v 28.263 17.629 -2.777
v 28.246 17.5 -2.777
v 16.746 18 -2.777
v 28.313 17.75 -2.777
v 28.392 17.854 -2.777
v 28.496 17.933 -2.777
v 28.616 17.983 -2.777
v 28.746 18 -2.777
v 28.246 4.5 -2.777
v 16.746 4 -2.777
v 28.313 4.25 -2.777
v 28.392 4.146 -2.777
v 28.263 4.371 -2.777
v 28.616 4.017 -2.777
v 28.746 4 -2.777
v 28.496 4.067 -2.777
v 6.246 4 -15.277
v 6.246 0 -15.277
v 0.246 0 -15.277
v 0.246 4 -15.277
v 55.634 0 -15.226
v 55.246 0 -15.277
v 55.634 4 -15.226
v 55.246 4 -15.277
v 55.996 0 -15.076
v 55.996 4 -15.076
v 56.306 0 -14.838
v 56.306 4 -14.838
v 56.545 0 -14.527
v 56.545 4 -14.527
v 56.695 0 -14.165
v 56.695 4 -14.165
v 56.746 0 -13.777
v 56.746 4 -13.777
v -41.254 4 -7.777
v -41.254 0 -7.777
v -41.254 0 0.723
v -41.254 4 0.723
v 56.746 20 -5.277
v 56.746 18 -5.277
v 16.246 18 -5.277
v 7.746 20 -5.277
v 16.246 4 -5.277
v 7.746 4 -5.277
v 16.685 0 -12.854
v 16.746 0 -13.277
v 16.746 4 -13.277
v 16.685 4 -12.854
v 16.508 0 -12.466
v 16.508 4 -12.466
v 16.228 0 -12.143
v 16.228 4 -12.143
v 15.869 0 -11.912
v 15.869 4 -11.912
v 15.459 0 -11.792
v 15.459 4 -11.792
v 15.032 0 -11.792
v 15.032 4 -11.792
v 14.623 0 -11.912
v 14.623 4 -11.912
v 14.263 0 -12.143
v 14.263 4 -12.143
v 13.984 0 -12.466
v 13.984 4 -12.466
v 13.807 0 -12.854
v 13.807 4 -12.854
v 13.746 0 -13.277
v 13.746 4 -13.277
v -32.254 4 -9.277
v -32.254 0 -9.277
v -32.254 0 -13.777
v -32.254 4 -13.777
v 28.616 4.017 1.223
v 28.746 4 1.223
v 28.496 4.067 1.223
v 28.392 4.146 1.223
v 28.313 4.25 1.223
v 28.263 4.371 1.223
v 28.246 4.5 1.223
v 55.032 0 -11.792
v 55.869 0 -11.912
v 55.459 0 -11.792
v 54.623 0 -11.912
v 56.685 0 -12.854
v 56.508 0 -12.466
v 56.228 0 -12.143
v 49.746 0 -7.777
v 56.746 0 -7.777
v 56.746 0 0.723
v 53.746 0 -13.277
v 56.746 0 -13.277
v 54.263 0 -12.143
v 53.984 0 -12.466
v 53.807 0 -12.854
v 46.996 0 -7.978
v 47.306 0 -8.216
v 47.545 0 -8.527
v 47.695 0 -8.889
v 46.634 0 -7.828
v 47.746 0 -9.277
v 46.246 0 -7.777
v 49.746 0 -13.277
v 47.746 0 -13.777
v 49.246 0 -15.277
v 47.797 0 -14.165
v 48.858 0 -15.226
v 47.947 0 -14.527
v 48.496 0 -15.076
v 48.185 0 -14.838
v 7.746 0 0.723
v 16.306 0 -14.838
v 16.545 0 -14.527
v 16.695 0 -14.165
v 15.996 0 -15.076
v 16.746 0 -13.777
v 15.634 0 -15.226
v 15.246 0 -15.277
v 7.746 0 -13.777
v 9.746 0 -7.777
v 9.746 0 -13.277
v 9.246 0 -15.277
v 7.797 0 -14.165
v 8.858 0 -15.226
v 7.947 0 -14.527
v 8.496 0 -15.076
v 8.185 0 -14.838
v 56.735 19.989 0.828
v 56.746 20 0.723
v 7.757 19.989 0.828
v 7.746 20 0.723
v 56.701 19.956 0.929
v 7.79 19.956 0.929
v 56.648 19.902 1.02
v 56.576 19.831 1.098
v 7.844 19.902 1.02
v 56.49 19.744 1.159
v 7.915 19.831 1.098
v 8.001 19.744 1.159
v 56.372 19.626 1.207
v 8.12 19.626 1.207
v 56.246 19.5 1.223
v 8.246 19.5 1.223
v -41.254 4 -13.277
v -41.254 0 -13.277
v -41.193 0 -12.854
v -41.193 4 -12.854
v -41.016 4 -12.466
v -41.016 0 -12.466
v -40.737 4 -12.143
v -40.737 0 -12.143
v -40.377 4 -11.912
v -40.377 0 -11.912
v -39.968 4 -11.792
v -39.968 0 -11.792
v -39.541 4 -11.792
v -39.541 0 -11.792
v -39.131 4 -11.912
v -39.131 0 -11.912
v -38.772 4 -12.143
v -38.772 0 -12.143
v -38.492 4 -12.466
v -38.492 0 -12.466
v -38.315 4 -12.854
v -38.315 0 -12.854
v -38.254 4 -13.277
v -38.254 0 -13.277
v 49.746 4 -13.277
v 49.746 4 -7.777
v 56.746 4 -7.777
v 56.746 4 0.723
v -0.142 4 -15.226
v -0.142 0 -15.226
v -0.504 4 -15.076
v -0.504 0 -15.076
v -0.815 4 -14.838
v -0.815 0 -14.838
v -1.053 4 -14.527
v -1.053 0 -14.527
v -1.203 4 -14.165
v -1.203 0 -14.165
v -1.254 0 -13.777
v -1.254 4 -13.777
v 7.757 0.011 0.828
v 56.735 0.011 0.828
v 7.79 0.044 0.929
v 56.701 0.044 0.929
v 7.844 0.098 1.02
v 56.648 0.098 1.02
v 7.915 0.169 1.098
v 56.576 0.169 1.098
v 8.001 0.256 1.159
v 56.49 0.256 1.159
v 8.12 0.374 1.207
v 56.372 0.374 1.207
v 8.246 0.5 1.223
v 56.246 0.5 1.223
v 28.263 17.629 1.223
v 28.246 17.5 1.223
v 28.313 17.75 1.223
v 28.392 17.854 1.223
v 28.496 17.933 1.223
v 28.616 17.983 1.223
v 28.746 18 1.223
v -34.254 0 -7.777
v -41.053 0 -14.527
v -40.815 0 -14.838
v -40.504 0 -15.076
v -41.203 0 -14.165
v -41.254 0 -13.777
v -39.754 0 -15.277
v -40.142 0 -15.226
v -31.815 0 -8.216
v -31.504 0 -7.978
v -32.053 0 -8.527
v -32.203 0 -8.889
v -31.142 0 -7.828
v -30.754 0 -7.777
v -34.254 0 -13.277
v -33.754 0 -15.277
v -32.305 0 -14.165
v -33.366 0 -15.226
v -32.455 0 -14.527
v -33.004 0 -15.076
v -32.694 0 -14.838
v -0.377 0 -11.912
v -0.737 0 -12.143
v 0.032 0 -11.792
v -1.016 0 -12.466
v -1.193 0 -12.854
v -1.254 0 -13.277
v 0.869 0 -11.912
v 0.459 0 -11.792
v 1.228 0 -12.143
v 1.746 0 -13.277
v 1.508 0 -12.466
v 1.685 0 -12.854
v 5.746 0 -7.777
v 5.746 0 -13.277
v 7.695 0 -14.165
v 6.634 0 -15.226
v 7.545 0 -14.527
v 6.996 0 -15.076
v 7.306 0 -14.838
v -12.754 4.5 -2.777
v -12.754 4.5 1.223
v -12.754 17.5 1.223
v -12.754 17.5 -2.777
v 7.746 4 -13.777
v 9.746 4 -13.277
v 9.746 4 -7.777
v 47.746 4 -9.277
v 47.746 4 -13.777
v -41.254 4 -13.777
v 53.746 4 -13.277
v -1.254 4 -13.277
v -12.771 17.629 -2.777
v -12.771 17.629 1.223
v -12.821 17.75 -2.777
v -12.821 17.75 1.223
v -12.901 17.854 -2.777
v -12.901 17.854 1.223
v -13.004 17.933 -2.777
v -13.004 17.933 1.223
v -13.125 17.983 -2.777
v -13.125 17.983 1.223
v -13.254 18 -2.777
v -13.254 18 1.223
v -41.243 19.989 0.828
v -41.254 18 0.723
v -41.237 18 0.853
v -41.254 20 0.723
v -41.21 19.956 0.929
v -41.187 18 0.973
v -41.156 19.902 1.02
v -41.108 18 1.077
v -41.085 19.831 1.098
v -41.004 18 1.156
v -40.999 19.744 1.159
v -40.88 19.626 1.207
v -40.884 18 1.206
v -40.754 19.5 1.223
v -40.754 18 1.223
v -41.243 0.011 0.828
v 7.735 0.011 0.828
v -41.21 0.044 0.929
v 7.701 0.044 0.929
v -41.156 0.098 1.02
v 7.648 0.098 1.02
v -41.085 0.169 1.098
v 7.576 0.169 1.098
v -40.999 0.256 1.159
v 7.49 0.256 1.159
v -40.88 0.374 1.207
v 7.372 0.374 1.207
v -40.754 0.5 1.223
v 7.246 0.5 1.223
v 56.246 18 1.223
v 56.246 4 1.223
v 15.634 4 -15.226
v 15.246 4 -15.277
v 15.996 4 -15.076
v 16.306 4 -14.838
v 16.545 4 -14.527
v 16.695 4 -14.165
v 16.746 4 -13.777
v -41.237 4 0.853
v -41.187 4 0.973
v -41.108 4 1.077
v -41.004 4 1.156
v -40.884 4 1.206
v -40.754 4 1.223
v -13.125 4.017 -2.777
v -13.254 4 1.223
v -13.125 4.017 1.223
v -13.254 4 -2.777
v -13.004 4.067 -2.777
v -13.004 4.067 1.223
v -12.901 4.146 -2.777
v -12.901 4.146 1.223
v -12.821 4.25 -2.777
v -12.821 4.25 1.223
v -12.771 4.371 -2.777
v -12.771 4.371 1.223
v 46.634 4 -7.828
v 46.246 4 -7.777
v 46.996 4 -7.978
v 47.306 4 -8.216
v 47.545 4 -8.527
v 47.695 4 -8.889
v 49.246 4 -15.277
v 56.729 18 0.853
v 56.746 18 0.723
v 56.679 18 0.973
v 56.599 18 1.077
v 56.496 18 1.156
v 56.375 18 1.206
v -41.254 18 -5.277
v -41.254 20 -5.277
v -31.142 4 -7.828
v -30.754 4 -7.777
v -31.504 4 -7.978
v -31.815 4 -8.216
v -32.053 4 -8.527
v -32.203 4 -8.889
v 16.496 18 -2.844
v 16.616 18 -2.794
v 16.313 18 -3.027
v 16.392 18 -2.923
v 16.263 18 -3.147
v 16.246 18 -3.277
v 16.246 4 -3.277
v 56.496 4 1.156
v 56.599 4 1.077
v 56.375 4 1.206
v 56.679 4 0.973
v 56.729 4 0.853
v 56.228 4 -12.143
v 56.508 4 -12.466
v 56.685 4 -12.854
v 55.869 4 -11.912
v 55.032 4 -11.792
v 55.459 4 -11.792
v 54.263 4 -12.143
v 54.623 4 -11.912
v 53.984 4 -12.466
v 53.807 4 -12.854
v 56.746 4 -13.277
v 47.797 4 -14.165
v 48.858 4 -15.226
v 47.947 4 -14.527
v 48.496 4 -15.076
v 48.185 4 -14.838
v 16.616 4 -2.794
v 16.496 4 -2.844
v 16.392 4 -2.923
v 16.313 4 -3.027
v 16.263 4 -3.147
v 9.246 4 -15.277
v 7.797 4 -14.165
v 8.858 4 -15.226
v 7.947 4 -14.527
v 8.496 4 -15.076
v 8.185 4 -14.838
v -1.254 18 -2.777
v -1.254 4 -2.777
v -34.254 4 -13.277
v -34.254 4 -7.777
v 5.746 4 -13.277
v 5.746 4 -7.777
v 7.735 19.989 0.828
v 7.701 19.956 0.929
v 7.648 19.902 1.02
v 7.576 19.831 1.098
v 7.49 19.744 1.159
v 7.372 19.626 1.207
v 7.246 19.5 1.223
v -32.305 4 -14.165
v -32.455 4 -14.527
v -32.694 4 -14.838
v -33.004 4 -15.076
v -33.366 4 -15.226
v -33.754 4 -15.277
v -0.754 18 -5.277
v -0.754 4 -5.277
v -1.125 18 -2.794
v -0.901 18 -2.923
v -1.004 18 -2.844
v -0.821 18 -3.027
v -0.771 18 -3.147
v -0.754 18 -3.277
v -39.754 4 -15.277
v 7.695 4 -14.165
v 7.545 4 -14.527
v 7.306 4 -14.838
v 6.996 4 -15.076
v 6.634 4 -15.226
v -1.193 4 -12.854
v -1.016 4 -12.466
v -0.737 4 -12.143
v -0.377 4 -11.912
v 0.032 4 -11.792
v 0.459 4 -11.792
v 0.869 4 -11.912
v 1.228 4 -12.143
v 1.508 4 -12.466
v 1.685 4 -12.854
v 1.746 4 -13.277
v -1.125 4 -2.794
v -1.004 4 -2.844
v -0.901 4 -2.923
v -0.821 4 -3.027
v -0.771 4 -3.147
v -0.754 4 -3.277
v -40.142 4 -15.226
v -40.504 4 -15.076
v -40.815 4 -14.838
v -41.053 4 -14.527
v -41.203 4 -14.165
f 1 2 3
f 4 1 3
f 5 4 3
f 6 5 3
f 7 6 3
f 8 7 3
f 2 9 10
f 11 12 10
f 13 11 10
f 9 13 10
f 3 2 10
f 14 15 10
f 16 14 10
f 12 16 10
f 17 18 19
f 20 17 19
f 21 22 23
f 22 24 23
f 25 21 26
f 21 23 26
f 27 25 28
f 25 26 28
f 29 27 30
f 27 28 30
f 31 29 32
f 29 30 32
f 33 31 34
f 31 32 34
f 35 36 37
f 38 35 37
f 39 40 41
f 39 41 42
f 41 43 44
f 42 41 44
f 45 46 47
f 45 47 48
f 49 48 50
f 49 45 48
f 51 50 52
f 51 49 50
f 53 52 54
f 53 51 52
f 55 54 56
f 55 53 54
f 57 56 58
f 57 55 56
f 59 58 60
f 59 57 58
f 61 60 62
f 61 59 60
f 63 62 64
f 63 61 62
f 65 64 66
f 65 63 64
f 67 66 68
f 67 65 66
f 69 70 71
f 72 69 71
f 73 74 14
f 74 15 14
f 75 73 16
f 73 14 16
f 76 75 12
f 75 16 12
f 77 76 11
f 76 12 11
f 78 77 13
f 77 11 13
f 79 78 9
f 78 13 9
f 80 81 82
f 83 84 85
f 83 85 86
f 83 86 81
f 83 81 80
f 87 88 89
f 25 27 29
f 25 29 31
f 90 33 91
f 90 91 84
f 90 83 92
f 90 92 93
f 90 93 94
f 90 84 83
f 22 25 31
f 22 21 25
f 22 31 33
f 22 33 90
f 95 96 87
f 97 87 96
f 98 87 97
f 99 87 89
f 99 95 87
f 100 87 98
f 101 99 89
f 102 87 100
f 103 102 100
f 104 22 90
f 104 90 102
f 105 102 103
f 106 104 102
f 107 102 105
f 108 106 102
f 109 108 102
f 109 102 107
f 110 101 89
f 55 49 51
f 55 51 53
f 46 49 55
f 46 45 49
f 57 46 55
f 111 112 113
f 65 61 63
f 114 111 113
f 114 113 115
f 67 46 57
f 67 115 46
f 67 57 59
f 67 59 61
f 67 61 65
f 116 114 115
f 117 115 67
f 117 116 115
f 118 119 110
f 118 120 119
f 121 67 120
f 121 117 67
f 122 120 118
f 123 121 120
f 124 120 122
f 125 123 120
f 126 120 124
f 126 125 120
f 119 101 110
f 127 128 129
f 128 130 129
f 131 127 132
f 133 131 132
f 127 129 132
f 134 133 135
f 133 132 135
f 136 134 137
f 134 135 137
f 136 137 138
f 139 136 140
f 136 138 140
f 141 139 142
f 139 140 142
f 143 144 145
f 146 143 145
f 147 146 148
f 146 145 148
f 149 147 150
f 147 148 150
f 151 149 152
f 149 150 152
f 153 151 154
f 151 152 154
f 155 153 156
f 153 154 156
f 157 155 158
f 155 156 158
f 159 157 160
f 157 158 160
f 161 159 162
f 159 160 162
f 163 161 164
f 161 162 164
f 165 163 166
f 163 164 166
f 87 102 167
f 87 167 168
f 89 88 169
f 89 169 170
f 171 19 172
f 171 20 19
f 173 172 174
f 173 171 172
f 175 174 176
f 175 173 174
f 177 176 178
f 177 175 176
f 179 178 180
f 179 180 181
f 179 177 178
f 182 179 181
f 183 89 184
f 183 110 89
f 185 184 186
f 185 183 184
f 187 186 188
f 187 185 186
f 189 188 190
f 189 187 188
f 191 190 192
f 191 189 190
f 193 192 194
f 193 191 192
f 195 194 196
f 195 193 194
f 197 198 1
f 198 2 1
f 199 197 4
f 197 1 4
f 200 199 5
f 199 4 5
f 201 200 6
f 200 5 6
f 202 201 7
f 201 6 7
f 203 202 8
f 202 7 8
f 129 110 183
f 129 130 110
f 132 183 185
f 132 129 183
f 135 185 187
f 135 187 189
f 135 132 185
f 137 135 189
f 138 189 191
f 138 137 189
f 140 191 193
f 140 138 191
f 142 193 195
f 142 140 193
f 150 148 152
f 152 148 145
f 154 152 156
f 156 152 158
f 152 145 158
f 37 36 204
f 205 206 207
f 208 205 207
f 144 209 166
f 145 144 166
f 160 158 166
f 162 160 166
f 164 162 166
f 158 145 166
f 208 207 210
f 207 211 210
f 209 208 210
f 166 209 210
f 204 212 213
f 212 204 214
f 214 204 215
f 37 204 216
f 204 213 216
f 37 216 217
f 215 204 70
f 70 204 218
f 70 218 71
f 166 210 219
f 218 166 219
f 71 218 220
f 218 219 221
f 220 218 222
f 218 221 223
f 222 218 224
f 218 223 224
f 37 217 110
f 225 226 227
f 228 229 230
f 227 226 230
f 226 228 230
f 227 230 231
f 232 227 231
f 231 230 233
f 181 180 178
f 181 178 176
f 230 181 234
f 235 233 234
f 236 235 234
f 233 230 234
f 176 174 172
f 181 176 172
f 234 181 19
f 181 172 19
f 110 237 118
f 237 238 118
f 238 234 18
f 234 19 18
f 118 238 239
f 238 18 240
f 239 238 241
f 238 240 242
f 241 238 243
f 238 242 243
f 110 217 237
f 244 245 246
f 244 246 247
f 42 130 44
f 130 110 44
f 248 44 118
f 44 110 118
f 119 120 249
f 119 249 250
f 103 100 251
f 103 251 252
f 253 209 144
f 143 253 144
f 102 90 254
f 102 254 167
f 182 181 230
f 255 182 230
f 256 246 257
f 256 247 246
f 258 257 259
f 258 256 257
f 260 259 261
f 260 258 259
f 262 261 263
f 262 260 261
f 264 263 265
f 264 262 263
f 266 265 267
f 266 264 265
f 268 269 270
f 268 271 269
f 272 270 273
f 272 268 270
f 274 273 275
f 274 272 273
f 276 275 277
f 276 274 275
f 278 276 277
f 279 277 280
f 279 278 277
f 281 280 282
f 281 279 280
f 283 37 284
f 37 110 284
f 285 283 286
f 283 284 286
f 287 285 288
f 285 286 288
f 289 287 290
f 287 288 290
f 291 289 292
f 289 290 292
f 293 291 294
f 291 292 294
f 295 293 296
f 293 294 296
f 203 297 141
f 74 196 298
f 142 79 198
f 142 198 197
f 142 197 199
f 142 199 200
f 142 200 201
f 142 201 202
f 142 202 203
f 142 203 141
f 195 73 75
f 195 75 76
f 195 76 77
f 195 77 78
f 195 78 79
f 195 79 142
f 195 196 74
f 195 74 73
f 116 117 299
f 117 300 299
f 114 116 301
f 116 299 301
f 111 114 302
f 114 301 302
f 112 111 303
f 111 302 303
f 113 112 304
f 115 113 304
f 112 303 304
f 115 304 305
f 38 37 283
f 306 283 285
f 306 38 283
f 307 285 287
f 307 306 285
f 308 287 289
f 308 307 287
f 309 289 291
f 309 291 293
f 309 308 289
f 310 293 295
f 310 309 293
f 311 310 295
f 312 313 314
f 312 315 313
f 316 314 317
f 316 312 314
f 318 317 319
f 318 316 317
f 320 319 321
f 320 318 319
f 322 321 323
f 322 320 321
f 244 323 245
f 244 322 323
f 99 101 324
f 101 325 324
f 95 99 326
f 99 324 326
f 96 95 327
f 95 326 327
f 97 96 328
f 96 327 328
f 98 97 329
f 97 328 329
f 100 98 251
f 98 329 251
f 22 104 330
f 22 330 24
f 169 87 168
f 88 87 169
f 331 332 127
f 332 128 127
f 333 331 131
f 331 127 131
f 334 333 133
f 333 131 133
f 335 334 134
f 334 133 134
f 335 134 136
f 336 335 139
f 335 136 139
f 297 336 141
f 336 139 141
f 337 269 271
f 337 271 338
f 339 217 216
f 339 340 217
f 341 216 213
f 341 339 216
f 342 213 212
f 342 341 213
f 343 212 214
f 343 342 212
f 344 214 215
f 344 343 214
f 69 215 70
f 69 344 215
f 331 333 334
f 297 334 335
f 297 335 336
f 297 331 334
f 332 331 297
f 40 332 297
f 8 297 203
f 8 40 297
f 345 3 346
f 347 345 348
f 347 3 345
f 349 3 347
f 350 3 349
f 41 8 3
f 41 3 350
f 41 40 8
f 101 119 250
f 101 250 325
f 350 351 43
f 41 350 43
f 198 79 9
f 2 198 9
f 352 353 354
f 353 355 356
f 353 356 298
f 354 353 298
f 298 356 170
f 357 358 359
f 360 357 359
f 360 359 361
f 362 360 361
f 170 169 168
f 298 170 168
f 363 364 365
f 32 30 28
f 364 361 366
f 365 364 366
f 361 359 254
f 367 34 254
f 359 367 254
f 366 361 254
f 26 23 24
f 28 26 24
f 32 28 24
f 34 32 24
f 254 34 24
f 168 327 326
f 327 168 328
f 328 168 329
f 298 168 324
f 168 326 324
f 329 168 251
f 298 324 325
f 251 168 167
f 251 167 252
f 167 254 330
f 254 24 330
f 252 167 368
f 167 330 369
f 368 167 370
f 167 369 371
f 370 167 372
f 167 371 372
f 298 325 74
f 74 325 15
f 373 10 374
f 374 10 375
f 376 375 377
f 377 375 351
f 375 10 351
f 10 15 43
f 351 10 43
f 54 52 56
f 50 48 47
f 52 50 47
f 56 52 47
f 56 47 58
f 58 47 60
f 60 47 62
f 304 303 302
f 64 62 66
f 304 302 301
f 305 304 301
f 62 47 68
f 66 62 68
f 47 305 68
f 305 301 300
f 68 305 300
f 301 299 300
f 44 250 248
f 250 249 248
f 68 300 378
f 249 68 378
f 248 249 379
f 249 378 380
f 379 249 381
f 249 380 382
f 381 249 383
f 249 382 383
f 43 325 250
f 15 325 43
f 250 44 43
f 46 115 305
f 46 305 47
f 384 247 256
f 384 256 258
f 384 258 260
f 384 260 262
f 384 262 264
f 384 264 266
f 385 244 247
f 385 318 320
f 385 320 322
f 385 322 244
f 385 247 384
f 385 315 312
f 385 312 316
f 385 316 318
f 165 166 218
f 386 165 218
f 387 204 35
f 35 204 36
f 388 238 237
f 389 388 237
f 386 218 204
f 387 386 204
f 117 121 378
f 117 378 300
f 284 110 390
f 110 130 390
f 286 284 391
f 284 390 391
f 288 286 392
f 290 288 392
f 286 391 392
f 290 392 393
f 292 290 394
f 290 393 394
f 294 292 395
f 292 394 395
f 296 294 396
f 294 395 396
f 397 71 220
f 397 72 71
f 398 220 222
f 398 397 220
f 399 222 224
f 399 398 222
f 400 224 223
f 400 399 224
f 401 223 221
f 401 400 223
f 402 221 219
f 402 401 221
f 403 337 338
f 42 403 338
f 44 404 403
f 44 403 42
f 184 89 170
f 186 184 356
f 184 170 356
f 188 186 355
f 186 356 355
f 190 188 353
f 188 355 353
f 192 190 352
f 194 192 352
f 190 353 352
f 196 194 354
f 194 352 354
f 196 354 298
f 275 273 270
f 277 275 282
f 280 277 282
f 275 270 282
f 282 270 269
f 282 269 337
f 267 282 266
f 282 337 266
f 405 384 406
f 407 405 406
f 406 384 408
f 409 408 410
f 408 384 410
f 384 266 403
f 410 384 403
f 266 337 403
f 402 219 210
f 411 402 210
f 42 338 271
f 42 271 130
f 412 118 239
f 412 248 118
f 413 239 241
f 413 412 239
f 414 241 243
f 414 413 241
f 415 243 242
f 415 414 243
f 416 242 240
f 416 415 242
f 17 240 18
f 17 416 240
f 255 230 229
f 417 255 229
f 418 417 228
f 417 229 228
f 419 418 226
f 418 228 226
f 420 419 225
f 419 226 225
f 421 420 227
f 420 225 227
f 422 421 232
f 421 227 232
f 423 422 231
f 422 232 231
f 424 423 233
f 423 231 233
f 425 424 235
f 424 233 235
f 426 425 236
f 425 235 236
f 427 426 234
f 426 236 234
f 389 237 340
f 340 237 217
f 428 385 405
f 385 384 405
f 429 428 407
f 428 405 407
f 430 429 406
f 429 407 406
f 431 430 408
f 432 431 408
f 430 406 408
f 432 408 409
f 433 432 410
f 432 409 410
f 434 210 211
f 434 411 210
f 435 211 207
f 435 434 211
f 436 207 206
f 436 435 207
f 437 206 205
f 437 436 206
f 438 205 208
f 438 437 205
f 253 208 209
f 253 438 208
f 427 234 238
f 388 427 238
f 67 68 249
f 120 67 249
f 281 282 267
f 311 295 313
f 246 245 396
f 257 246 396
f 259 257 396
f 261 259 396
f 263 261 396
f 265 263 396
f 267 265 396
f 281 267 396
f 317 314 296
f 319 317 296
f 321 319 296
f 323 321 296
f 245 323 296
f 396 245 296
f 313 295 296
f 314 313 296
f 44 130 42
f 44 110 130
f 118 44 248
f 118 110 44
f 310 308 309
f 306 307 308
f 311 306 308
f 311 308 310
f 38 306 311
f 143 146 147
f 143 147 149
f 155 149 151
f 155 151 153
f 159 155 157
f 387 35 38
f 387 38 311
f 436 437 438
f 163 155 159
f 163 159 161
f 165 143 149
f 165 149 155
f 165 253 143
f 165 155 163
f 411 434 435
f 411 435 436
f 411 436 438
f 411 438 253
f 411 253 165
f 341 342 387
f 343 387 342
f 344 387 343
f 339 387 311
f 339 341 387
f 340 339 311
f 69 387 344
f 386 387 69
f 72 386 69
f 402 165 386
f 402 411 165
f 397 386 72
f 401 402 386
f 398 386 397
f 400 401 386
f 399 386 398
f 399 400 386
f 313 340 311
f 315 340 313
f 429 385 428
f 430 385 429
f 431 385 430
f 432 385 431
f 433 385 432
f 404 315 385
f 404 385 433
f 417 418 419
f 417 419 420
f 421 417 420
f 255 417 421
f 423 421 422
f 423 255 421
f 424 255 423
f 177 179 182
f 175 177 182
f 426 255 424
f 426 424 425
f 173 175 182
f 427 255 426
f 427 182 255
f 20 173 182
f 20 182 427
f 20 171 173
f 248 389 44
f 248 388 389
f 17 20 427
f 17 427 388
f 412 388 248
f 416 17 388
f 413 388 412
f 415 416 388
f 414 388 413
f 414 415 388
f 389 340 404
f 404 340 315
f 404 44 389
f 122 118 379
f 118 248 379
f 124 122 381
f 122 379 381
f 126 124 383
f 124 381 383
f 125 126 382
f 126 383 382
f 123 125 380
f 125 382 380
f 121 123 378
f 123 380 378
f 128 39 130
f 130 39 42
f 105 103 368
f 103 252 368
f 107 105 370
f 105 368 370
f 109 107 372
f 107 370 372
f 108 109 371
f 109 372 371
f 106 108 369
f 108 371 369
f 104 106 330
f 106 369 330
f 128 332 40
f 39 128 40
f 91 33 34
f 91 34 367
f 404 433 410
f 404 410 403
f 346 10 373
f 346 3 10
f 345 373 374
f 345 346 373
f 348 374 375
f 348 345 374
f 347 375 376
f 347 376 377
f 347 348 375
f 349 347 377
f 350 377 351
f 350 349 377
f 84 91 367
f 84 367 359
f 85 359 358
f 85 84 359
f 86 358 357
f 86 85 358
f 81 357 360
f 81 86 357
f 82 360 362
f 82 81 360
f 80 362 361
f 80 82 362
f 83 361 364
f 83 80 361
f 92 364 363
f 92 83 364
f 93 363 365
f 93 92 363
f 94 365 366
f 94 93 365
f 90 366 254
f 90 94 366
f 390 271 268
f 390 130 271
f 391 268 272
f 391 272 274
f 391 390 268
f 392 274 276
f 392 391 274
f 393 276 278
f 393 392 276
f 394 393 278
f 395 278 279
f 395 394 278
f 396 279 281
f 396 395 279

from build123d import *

# Parameters (mm, degrees)
EXTRUDE_1_DEPTH = 4
FILLET_1_R      = 1.5
EXTRUDE_2_DEPTH = 14
SKETCH_3_W      = 49
SKETCH_3_H      = 6.5
EXTRUDE_3_DEPTH = 2
FILLET_2_R      = 0.5
FILLET_3_R      = 1.5


with BuildPart() as part:
    # 草图1 → 凸台-拉伸1 (new body)
    with BuildSketch(Plane(origin=(0, 0, 0), x_dir=(1, 0, 0), z_dir=(0, 1, 0))):
        with BuildLine():
            Line((-34.254247299, 7.776879268), (-41.254247299, 7.776879268))
            Line((-41.254247299, 7.776879268), (-41.254247299, -1.223120732))
            Line((-41.254247299, -1.223120732), (7.745752701, -1.223120732))
            Line((7.745752701, -1.223120732), (7.745752701, 7.776879268))
            Line((7.745752701, 7.776879268), (7.745752701, 12.776879268))
            Line((7.745752701, 12.776879268), (7.745752701, 15.276879268))
            Line((7.745752701, 15.276879268), (5.745752701, 15.276879268))
            Line((5.745752701, 15.276879268), (-1.254247299, 15.276879268))
            Line((-1.254247299, 15.276879268), (-1.254247299, 13.276879268))
            ThreePointArc((-1.254247299, 13.276879268), (0.245752701, 11.776879268), (1.745752701, 13.276879268))
            Line((1.745752701, 13.276879268), (5.745752701, 13.276879268))
            Line((5.745752701, 13.276879268), (5.745752701, 7.776879268))
            Line((5.745752701, 7.776879268), (-32.254247299, 7.776879268))
            Line((-32.254247299, 7.776879268), (-32.254247299, 15.276879268))
            Line((-32.254247299, 15.276879268), (-34.254247299, 15.276879268))
            Line((-34.254247299, 15.276879268), (-41.254247299, 15.276879268))
            Line((-41.254247299, 15.276879268), (-41.254247299, 13.276879268))
            ThreePointArc((-41.254247299, 13.276879268), (-39.754247299, 11.776879268), (-38.254247299, 13.276879268))
            Line((-38.254247299, 13.276879268), (-34.254247299, 13.276879268))
            Line((-34.254247299, 13.276879268), (-34.254247299, 7.776879268))
        make_face()
    extrude(amount=EXTRUDE_1_DEPTH)

    # 圆角1
    fillet_1_edges = [part.edges().sort_by_distance(p)[0] for p in [
        (-41.254247299, 2, -15.276879268),
        (-32.254247299, 2, -15.276879268),
        (-1.254247299, 2, -15.276879268),
        (7.745752701, 2, -15.276879268),
    ]]
    fillet(fillet_1_edges, radius=FILLET_1_R)

    # 草图2 → 凸台-拉伸2 (add)
    with BuildSketch(Plane(origin=(0, 4, 0), x_dir=(1, 0, 0), z_dir=(0, 1, 0))):
        Polygon((7.745752701, -1.223120732), (-0.754247299, -1.223120732), (-12.754247299, -1.223120732), (-12.754247299, 2.776879268), (-0.754247299, 2.776879268), (-0.754247299, 5.276879268), (7.745752701, 5.276879268), align=None)
    extrude(amount=EXTRUDE_2_DEPTH)

    # 草图3 → 凸台-拉伸3 (add)
    with BuildSketch(Plane(origin=(0, 18, 0), x_dir=(1, 0, 0), z_dir=(0, 1, 0))):
        with Locations((-16.754247299, 2.026879268)):
            Rectangle(SKETCH_3_W, SKETCH_3_H)
    extrude(amount=EXTRUDE_3_DEPTH)

    # 圆角2
    fillet_2_edges = [part.edges().sort_by_distance(p)[0] for p in [
        (-0.754247299, 11, -2.776879268),
        (-12.754247299, 4, -0.776879268),
        (-12.754247299, 18, -0.776879268),
        (-41.254247299, 19, 1.223120732),
        (-16.754247299, 20, 1.223120732),
        (-16.754247299, 0, 1.223120732),
        (7.745752701, 10, 1.223120732),
        (-41.254247299, 2, 1.223120732),
    ]]
    fillet(fillet_2_edges, radius=FILLET_2_R)

    # 圆角3
    fillet_3_edges = [part.edges().sort_by_distance(p)[0] for p in [
        (-32.254247299, 2, -7.776879268),
    ]]
    fillet(fillet_3_edges, radius=FILLET_3_R)


with BuildPart() as body_2:
    # 镜向1: mirrored copy
    add(part.part.mirror(Plane(origin=(7.745752701, 4, 0), x_dir=(0, 0, 1), z_dir=(1, 0, 0))))


solid = Compound([part.part, body_2.part])
